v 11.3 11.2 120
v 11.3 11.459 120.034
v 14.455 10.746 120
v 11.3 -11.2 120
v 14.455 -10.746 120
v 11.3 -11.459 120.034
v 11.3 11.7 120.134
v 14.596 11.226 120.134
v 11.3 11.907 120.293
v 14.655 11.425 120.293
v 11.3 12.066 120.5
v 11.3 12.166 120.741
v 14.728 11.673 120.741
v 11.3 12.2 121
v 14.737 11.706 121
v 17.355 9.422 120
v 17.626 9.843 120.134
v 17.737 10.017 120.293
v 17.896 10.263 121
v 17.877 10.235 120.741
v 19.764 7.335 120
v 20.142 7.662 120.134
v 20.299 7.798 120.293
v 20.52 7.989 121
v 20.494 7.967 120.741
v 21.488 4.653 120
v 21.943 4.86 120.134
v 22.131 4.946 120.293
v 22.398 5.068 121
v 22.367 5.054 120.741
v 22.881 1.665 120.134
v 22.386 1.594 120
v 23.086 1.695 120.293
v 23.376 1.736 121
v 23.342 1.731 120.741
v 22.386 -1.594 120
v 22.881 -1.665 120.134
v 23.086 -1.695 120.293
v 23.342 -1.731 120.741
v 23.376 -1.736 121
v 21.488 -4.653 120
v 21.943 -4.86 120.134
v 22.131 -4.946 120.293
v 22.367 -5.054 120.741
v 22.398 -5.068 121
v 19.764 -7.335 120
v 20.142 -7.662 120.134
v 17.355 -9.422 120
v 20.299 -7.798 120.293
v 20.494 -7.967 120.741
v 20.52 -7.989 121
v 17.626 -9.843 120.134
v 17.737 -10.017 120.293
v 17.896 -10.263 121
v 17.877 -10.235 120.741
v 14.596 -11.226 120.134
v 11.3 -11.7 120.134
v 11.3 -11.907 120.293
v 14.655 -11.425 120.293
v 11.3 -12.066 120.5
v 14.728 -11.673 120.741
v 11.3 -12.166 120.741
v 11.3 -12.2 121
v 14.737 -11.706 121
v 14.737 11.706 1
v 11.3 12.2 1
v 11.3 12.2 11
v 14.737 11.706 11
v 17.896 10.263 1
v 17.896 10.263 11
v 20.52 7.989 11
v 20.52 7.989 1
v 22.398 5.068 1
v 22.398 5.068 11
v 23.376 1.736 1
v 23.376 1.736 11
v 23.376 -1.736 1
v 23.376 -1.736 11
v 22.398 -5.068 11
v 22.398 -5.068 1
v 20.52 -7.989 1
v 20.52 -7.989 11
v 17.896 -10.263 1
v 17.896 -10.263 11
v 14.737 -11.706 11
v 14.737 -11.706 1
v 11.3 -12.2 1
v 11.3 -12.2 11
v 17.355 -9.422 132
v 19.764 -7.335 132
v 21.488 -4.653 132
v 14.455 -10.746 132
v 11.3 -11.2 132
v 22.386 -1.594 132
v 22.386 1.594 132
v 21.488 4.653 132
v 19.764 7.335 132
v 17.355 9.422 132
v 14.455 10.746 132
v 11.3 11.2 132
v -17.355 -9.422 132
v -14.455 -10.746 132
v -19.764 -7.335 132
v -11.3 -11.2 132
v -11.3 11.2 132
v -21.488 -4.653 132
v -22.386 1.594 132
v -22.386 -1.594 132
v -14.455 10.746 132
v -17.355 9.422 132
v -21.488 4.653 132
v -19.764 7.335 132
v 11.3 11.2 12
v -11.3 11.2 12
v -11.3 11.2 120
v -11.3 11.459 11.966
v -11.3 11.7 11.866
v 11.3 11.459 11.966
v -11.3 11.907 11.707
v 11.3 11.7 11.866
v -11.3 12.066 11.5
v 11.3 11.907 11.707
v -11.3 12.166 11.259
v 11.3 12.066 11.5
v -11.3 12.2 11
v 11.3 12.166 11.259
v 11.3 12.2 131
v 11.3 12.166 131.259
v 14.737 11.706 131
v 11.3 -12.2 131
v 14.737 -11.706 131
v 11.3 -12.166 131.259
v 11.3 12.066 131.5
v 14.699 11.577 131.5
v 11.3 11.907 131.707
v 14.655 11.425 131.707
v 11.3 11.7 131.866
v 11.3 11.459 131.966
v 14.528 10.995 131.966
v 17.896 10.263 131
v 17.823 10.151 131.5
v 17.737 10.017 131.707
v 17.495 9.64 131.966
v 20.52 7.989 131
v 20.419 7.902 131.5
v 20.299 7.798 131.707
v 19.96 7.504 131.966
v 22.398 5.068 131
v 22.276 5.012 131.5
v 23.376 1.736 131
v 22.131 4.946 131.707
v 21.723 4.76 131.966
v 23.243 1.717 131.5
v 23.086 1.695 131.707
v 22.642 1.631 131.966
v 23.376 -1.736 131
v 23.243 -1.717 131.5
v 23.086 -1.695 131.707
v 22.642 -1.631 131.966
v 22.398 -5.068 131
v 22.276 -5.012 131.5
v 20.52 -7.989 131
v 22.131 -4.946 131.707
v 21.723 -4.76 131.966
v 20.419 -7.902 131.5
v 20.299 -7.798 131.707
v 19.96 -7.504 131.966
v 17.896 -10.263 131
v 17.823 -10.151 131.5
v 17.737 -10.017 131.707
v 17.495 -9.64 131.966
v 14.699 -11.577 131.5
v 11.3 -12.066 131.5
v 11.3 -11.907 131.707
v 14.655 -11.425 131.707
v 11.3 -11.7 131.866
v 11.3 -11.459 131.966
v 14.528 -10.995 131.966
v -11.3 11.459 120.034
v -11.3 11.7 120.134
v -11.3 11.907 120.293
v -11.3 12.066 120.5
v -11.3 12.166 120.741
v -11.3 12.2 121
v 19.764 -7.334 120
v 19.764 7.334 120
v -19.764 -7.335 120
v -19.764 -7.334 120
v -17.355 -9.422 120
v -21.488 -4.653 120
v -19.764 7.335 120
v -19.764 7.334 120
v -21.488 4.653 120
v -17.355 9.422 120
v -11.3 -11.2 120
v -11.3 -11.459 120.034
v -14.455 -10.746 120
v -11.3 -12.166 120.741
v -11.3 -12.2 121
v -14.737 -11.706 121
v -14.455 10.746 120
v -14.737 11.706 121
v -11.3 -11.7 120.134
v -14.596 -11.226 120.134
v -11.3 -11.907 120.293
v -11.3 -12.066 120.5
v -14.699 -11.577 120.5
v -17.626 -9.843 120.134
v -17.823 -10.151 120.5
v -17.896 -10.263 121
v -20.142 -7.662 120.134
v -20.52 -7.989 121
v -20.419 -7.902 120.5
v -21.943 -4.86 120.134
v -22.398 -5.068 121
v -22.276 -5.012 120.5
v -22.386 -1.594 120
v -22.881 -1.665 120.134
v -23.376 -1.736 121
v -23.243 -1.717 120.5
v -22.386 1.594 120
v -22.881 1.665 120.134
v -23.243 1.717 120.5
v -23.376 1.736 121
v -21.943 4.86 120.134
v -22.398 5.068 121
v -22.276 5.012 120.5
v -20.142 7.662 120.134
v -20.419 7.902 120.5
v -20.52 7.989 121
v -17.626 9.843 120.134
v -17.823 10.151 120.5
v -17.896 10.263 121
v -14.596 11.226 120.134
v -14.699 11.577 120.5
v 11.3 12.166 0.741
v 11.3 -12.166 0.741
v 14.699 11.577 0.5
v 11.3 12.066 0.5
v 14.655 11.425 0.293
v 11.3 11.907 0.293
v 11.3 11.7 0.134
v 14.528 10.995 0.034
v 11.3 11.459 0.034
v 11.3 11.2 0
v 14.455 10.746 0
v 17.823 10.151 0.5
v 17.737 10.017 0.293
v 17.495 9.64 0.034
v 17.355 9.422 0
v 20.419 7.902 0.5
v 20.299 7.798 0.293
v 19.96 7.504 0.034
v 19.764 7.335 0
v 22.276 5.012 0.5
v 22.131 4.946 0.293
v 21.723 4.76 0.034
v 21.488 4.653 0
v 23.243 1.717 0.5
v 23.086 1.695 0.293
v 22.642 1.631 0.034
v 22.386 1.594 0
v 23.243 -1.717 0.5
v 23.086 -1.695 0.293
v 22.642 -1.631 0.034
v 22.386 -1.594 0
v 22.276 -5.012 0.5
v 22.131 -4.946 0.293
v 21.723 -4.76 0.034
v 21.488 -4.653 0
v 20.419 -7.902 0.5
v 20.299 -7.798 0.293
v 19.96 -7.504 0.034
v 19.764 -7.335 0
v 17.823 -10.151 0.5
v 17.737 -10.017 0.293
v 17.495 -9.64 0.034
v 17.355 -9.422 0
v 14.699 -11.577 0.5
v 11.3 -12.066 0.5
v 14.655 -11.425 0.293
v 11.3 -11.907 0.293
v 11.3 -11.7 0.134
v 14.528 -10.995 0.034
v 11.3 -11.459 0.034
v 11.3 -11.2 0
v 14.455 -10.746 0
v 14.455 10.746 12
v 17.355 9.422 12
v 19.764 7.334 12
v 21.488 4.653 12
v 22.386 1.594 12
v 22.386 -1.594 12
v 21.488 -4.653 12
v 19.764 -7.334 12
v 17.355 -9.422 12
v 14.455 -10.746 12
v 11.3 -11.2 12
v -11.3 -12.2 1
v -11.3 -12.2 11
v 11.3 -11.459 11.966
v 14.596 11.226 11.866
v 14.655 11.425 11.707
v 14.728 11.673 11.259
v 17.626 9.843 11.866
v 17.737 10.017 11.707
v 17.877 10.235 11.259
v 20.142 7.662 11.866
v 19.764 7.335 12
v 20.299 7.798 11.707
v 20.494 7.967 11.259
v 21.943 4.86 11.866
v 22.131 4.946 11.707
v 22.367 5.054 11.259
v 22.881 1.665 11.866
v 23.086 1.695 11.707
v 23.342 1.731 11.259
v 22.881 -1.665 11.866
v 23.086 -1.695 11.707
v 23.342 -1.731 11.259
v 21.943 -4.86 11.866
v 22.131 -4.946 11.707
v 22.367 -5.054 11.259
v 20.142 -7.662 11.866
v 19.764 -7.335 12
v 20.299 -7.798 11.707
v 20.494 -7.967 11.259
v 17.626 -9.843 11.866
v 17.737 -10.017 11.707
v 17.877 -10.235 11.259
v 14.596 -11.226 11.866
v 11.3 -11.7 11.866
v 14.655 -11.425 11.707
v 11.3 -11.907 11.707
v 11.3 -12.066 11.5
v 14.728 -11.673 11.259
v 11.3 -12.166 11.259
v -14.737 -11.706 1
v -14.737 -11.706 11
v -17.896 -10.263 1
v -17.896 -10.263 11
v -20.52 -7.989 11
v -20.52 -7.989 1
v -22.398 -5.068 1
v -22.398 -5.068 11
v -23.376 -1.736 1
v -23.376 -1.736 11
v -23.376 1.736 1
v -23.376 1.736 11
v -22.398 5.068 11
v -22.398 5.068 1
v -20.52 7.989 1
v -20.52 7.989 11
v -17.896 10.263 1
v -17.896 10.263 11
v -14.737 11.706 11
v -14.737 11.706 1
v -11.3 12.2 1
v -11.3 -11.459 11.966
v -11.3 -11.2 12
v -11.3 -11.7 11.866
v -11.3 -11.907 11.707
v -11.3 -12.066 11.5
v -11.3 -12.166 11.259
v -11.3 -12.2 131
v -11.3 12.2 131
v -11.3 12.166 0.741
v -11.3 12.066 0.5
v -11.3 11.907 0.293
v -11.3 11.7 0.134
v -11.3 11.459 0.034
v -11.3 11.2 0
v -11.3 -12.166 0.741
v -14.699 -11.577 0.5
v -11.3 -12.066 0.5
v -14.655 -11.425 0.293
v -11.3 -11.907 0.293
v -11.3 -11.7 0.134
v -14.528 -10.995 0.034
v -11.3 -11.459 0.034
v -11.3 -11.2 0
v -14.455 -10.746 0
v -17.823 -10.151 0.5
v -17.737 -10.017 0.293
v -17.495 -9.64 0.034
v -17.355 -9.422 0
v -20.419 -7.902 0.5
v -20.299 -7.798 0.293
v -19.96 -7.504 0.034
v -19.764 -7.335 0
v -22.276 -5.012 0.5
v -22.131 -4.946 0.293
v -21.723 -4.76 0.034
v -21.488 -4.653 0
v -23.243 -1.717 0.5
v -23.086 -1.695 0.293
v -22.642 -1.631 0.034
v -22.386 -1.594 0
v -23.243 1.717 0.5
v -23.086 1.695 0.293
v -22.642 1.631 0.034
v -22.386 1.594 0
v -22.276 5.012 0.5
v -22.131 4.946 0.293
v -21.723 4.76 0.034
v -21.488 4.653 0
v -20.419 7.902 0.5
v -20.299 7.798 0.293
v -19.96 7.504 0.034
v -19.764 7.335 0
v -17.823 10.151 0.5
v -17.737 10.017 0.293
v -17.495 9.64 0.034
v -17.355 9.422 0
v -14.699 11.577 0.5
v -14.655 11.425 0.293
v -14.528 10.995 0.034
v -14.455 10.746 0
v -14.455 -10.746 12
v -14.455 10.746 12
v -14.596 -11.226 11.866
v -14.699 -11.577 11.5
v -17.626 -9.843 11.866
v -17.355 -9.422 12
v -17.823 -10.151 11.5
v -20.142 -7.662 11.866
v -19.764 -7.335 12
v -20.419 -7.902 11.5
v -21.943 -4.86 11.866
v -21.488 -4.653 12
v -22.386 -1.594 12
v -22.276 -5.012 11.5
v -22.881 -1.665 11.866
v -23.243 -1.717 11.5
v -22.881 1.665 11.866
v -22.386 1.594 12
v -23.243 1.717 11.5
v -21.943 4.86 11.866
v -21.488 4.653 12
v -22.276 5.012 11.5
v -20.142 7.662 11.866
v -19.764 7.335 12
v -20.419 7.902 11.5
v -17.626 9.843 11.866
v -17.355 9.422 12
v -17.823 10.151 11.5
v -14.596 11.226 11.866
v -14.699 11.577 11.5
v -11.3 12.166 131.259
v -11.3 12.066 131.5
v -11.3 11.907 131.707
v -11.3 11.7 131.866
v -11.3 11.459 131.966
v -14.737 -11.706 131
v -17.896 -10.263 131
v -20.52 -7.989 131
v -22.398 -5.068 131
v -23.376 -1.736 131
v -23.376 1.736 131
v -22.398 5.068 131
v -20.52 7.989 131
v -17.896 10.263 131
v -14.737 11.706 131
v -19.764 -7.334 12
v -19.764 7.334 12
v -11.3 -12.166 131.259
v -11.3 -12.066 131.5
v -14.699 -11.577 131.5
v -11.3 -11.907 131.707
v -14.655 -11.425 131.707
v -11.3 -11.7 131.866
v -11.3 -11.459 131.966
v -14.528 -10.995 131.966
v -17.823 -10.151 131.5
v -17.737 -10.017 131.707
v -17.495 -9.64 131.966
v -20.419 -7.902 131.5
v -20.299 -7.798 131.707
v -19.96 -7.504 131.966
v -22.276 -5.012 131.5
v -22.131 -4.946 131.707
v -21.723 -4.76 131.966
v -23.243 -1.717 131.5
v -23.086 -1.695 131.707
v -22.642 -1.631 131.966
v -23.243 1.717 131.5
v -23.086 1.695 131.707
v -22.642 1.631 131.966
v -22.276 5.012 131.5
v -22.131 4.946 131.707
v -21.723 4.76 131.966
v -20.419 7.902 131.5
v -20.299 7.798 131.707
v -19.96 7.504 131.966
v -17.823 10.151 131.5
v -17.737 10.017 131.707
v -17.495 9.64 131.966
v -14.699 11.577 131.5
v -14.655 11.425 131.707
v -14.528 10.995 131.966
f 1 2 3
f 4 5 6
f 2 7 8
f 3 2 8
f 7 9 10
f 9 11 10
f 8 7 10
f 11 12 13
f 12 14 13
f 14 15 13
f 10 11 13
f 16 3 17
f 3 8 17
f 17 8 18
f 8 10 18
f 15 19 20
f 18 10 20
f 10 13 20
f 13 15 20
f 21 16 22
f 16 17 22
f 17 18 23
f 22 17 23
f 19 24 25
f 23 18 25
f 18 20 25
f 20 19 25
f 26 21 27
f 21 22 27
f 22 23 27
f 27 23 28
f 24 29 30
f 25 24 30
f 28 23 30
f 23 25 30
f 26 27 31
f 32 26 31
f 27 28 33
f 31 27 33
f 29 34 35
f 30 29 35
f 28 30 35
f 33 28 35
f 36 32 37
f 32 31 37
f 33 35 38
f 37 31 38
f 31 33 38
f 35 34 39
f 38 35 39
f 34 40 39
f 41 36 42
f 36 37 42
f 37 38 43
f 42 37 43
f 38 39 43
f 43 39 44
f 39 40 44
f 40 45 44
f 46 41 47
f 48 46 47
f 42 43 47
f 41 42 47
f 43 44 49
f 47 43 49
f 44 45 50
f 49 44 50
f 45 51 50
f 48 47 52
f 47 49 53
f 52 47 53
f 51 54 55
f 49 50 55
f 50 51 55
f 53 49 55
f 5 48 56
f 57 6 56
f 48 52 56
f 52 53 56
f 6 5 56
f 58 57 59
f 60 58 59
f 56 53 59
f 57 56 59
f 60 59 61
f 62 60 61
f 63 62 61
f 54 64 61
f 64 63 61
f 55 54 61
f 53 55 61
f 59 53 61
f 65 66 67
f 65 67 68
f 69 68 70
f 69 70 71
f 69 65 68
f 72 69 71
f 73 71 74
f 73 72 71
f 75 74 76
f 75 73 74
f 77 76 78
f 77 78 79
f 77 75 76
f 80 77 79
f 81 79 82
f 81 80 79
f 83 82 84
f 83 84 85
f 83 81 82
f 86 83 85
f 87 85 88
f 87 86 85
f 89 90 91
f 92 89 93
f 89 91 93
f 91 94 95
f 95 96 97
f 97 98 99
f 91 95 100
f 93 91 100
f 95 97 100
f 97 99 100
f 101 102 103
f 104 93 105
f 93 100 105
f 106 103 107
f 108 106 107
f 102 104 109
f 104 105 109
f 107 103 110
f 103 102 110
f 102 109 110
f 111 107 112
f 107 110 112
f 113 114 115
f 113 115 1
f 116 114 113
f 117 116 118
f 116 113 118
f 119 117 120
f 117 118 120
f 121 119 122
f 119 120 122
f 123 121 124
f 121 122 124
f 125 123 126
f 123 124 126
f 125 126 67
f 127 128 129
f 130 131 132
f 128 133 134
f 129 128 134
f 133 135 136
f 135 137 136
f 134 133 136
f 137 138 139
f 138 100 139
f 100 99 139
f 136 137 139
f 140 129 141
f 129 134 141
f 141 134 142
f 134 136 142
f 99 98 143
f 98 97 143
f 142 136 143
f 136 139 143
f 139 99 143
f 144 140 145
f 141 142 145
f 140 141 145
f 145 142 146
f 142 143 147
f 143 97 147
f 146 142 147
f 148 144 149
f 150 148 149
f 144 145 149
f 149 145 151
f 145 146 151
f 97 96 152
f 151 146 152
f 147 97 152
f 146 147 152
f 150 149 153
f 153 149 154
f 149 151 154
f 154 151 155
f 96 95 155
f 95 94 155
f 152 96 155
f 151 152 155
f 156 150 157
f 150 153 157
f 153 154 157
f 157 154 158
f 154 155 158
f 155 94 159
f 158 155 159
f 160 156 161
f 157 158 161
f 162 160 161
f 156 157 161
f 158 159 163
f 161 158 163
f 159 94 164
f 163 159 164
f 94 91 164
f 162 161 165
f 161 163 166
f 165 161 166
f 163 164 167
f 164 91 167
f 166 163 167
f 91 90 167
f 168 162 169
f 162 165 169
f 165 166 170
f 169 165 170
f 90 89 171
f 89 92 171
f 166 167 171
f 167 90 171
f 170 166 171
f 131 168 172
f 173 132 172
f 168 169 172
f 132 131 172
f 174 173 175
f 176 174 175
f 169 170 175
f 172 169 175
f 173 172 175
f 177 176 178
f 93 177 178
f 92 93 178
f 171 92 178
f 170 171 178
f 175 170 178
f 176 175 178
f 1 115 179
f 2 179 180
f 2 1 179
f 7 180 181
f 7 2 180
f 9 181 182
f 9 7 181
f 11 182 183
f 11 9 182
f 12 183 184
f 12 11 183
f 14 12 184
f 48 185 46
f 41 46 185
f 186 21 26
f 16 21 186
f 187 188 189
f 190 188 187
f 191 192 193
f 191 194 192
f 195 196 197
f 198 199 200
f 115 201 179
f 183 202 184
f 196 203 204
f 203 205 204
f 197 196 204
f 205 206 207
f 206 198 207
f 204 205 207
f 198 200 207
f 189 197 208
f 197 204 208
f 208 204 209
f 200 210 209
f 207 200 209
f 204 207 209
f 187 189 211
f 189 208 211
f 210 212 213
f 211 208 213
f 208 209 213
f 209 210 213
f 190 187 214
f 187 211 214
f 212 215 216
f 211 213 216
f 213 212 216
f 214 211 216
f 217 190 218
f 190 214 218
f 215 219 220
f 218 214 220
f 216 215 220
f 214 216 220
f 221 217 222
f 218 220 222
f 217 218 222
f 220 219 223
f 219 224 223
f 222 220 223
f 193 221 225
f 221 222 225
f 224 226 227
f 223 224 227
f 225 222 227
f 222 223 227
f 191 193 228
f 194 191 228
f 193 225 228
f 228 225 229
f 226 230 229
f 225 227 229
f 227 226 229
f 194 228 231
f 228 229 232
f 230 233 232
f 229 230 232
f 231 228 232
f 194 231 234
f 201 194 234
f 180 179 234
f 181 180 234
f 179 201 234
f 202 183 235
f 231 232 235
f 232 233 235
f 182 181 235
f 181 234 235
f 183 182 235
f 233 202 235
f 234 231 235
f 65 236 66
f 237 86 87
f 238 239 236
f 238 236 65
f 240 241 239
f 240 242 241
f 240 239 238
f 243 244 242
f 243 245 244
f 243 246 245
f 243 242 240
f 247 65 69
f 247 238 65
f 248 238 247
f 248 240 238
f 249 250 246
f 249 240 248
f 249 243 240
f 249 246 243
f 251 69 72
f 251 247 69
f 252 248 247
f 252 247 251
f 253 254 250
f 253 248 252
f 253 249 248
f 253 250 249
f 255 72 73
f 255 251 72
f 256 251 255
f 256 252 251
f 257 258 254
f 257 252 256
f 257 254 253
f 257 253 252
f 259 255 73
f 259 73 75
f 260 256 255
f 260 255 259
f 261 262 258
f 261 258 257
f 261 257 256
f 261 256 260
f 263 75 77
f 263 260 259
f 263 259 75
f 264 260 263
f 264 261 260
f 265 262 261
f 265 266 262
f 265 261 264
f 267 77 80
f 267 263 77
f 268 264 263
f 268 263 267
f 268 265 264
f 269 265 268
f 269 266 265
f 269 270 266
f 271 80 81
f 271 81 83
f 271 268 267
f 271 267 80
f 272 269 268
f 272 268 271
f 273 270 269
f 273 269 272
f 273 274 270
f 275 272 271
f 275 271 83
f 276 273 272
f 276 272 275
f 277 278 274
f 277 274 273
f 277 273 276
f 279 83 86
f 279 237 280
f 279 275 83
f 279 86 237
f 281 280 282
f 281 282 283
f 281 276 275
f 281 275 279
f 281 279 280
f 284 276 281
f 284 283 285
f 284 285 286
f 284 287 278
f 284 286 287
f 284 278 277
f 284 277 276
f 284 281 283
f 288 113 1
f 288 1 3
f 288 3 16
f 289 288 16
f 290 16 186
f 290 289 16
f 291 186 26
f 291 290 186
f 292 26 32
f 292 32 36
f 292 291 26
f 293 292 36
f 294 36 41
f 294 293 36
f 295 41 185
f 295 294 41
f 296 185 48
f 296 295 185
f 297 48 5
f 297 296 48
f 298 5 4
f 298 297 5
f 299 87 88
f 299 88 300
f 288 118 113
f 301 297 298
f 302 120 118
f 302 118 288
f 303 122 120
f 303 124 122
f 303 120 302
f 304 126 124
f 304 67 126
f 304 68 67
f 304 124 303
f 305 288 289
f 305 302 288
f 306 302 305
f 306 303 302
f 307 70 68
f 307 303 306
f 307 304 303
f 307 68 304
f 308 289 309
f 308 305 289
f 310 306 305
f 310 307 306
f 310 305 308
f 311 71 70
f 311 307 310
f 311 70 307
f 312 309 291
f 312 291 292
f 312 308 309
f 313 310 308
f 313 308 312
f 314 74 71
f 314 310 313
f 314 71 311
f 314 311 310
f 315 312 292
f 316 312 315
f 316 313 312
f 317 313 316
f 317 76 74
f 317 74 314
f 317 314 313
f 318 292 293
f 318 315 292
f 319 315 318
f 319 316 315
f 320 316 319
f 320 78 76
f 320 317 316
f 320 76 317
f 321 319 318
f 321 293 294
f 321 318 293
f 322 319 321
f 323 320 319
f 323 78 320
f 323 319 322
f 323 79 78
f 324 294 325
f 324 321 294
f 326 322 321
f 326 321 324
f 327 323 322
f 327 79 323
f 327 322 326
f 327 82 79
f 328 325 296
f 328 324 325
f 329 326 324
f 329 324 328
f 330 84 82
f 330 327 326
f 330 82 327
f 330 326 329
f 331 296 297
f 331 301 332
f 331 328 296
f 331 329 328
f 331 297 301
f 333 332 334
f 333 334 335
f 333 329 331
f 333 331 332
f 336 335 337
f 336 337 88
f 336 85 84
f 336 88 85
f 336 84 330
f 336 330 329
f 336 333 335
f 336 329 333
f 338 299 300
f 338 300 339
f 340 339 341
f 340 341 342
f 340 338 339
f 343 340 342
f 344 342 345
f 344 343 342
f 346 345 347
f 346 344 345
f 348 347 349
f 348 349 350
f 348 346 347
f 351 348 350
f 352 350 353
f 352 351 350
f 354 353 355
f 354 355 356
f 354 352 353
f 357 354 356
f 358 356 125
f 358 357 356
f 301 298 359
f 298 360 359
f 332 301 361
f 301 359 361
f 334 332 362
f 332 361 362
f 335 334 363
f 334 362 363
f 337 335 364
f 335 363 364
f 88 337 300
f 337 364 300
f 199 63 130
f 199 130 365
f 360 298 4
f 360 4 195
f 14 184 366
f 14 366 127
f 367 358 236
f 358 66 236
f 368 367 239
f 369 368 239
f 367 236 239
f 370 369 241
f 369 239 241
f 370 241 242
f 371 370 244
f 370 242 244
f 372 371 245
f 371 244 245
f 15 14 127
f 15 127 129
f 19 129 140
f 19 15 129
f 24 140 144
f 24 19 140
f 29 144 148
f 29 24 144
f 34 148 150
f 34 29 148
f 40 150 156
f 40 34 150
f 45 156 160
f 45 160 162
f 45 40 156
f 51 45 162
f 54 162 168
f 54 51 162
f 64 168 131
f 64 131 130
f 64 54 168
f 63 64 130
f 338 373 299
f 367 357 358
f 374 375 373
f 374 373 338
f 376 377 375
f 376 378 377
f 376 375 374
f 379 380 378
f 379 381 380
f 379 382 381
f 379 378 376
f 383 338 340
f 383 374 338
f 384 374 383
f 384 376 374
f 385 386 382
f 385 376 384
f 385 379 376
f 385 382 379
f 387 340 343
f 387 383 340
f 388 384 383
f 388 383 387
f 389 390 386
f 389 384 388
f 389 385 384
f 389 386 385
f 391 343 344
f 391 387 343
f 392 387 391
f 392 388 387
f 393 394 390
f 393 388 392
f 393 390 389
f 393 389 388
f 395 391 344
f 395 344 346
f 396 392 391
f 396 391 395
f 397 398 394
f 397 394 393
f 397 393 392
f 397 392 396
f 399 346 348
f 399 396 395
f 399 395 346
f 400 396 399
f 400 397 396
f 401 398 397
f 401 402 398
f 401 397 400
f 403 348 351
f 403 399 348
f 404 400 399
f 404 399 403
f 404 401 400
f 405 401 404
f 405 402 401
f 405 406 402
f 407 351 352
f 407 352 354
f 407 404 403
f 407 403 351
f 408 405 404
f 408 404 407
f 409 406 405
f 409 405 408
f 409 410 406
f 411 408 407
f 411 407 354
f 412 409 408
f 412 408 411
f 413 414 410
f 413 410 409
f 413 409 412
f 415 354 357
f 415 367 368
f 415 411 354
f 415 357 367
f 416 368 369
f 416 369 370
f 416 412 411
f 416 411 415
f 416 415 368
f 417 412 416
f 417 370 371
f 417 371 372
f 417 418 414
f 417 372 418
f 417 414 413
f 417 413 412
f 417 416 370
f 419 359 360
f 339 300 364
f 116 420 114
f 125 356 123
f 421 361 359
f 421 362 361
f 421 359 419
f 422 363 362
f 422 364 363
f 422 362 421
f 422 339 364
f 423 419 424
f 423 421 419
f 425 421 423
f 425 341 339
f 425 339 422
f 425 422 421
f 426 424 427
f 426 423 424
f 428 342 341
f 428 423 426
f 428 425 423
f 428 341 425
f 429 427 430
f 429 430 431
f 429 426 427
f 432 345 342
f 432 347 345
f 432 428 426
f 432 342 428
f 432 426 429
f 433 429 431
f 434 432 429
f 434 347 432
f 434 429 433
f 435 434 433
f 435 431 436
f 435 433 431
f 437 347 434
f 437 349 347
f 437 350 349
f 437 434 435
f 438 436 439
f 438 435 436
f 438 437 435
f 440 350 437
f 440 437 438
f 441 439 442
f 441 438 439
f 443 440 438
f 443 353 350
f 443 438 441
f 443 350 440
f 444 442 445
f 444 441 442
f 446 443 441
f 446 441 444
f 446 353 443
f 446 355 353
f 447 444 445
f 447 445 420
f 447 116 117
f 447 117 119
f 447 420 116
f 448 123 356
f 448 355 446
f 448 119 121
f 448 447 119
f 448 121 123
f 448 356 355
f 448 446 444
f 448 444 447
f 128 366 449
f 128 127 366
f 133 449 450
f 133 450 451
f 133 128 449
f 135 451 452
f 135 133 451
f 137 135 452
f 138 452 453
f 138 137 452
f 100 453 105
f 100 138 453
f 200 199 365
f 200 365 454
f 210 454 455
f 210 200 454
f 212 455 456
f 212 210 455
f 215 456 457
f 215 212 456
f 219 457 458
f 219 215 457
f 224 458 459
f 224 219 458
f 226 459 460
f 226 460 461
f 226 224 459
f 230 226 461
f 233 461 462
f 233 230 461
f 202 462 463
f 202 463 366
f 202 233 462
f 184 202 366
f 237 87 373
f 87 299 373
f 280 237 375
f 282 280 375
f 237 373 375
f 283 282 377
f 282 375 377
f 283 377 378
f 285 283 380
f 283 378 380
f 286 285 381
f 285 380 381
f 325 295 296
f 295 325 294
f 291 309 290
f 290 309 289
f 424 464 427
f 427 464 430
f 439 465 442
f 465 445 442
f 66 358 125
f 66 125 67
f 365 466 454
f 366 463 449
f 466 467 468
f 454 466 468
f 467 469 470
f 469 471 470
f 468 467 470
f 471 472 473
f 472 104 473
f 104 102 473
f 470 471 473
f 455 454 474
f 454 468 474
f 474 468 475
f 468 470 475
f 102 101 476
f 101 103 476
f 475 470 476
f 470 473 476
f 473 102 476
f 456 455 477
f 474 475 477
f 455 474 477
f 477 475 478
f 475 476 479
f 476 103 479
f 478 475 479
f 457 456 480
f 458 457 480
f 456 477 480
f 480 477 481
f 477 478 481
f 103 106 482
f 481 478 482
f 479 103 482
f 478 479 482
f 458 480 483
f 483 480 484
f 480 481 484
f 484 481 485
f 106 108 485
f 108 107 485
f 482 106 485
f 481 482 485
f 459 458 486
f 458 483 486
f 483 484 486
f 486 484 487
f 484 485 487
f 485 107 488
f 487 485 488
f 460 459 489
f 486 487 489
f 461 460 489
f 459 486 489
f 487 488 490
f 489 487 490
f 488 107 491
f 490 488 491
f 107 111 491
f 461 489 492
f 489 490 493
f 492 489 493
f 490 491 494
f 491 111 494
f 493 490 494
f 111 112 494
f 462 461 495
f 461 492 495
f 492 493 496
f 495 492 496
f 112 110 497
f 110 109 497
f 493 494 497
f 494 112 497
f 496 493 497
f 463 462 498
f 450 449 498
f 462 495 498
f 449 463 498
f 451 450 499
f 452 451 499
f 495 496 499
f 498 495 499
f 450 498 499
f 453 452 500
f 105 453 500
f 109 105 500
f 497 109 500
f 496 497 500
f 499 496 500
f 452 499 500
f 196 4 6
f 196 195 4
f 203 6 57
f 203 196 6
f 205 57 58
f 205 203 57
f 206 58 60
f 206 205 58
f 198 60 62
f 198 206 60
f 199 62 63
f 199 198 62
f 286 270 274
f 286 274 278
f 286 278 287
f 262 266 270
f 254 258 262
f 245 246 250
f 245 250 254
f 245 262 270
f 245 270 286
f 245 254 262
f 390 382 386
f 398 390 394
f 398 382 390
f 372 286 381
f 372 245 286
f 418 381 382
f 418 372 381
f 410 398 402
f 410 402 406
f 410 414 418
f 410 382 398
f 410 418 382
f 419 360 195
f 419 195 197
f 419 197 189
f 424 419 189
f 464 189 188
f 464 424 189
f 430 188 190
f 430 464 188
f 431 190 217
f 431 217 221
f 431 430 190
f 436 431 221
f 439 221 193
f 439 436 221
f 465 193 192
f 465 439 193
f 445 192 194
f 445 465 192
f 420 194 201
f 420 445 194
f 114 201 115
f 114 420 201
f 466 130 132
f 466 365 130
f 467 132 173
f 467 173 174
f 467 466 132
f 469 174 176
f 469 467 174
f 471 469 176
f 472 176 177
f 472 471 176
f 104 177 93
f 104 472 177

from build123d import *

# Parameters (mm, degrees)
EXTRUDE_1_DEPTH     = 132
CUT_EXTRUDE_1_DEPTH = 108
FILLET_1_R          = 1


with BuildPart() as part:
    # 草图1 → 凸台-拉伸1 (new body)
    with BuildSketch(Plane.XY):
        with BuildLine():
            Line((-11.3, 12.2), (11.3, 12.2))
            ThreePointArc((11.3, 12.2), (23.5, 0), (11.3, -12.2))
            Line((11.3, -12.2), (-11.3, -12.2))
            ThreePointArc((-11.3, -12.2), (-23.5, 0), (-11.3, 12.2))
        make_face()
    extrude(amount=EXTRUDE_1_DEPTH)

    # 草图2 → 切除-拉伸1 (cut)
    with BuildSketch(Plane(origin=(0, 0, 12), x_dir=(-1, 0, 0), z_dir=(0, 0, -1))):
        with BuildLine():
            Line((11.3, 12.2), (-11.3, 12.2))
            ThreePointArc((-11.3, 12.2), (-23.5, 0), (-11.3, -12.2))
            Line((-11.3, -12.2), (11.3, -12.2))
            ThreePointArc((11.3, -12.2), (23.5, 0), (11.3, 12.2))
        make_face()
        with BuildLine():
            Line((11.3, 11.2), (-11.3, 11.2))
            ThreePointArc((-11.3, 11.2), (-22.5, 0), (-11.3, -11.2))
            Line((-11.3, -11.2), (11.3, -11.2))
            ThreePointArc((11.3, -11.2), (22.5, 0), (11.3, 11.2))
        make_face(mode=Mode.SUBTRACT)
    extrude(amount=-CUT_EXTRUDE_1_DEPTH, mode=Mode.SUBTRACT)

    # 圆角1
    fillet_1_edges = [part.edges().sort_by_distance(p)[0] for p in [
        (23.5, 0, 132),
        (0, 12.2, 132),
        (-23.5, 0, 120),
        (0, -12.2, 120),
        (23.5, 0, 120),
        (0, 12.2, 120),
        (-23.5, 0, 12),
        (0, 12.2, 12),
        (23.5, 0, 12),
        (0, -12.2, 12),
        (-23.5, 0, 132),
        (0, 12.2, 0),
        (23.5, 0, 0),
        (0, -12.2, 0),
        (-23.5, 0, 0),
        (0, -12.2, 132),
    ]]
    fillet(fillet_1_edges, radius=FILLET_1_R - 0.0001)  # a hair under: the kernel refuses the full size


solid = part.part
